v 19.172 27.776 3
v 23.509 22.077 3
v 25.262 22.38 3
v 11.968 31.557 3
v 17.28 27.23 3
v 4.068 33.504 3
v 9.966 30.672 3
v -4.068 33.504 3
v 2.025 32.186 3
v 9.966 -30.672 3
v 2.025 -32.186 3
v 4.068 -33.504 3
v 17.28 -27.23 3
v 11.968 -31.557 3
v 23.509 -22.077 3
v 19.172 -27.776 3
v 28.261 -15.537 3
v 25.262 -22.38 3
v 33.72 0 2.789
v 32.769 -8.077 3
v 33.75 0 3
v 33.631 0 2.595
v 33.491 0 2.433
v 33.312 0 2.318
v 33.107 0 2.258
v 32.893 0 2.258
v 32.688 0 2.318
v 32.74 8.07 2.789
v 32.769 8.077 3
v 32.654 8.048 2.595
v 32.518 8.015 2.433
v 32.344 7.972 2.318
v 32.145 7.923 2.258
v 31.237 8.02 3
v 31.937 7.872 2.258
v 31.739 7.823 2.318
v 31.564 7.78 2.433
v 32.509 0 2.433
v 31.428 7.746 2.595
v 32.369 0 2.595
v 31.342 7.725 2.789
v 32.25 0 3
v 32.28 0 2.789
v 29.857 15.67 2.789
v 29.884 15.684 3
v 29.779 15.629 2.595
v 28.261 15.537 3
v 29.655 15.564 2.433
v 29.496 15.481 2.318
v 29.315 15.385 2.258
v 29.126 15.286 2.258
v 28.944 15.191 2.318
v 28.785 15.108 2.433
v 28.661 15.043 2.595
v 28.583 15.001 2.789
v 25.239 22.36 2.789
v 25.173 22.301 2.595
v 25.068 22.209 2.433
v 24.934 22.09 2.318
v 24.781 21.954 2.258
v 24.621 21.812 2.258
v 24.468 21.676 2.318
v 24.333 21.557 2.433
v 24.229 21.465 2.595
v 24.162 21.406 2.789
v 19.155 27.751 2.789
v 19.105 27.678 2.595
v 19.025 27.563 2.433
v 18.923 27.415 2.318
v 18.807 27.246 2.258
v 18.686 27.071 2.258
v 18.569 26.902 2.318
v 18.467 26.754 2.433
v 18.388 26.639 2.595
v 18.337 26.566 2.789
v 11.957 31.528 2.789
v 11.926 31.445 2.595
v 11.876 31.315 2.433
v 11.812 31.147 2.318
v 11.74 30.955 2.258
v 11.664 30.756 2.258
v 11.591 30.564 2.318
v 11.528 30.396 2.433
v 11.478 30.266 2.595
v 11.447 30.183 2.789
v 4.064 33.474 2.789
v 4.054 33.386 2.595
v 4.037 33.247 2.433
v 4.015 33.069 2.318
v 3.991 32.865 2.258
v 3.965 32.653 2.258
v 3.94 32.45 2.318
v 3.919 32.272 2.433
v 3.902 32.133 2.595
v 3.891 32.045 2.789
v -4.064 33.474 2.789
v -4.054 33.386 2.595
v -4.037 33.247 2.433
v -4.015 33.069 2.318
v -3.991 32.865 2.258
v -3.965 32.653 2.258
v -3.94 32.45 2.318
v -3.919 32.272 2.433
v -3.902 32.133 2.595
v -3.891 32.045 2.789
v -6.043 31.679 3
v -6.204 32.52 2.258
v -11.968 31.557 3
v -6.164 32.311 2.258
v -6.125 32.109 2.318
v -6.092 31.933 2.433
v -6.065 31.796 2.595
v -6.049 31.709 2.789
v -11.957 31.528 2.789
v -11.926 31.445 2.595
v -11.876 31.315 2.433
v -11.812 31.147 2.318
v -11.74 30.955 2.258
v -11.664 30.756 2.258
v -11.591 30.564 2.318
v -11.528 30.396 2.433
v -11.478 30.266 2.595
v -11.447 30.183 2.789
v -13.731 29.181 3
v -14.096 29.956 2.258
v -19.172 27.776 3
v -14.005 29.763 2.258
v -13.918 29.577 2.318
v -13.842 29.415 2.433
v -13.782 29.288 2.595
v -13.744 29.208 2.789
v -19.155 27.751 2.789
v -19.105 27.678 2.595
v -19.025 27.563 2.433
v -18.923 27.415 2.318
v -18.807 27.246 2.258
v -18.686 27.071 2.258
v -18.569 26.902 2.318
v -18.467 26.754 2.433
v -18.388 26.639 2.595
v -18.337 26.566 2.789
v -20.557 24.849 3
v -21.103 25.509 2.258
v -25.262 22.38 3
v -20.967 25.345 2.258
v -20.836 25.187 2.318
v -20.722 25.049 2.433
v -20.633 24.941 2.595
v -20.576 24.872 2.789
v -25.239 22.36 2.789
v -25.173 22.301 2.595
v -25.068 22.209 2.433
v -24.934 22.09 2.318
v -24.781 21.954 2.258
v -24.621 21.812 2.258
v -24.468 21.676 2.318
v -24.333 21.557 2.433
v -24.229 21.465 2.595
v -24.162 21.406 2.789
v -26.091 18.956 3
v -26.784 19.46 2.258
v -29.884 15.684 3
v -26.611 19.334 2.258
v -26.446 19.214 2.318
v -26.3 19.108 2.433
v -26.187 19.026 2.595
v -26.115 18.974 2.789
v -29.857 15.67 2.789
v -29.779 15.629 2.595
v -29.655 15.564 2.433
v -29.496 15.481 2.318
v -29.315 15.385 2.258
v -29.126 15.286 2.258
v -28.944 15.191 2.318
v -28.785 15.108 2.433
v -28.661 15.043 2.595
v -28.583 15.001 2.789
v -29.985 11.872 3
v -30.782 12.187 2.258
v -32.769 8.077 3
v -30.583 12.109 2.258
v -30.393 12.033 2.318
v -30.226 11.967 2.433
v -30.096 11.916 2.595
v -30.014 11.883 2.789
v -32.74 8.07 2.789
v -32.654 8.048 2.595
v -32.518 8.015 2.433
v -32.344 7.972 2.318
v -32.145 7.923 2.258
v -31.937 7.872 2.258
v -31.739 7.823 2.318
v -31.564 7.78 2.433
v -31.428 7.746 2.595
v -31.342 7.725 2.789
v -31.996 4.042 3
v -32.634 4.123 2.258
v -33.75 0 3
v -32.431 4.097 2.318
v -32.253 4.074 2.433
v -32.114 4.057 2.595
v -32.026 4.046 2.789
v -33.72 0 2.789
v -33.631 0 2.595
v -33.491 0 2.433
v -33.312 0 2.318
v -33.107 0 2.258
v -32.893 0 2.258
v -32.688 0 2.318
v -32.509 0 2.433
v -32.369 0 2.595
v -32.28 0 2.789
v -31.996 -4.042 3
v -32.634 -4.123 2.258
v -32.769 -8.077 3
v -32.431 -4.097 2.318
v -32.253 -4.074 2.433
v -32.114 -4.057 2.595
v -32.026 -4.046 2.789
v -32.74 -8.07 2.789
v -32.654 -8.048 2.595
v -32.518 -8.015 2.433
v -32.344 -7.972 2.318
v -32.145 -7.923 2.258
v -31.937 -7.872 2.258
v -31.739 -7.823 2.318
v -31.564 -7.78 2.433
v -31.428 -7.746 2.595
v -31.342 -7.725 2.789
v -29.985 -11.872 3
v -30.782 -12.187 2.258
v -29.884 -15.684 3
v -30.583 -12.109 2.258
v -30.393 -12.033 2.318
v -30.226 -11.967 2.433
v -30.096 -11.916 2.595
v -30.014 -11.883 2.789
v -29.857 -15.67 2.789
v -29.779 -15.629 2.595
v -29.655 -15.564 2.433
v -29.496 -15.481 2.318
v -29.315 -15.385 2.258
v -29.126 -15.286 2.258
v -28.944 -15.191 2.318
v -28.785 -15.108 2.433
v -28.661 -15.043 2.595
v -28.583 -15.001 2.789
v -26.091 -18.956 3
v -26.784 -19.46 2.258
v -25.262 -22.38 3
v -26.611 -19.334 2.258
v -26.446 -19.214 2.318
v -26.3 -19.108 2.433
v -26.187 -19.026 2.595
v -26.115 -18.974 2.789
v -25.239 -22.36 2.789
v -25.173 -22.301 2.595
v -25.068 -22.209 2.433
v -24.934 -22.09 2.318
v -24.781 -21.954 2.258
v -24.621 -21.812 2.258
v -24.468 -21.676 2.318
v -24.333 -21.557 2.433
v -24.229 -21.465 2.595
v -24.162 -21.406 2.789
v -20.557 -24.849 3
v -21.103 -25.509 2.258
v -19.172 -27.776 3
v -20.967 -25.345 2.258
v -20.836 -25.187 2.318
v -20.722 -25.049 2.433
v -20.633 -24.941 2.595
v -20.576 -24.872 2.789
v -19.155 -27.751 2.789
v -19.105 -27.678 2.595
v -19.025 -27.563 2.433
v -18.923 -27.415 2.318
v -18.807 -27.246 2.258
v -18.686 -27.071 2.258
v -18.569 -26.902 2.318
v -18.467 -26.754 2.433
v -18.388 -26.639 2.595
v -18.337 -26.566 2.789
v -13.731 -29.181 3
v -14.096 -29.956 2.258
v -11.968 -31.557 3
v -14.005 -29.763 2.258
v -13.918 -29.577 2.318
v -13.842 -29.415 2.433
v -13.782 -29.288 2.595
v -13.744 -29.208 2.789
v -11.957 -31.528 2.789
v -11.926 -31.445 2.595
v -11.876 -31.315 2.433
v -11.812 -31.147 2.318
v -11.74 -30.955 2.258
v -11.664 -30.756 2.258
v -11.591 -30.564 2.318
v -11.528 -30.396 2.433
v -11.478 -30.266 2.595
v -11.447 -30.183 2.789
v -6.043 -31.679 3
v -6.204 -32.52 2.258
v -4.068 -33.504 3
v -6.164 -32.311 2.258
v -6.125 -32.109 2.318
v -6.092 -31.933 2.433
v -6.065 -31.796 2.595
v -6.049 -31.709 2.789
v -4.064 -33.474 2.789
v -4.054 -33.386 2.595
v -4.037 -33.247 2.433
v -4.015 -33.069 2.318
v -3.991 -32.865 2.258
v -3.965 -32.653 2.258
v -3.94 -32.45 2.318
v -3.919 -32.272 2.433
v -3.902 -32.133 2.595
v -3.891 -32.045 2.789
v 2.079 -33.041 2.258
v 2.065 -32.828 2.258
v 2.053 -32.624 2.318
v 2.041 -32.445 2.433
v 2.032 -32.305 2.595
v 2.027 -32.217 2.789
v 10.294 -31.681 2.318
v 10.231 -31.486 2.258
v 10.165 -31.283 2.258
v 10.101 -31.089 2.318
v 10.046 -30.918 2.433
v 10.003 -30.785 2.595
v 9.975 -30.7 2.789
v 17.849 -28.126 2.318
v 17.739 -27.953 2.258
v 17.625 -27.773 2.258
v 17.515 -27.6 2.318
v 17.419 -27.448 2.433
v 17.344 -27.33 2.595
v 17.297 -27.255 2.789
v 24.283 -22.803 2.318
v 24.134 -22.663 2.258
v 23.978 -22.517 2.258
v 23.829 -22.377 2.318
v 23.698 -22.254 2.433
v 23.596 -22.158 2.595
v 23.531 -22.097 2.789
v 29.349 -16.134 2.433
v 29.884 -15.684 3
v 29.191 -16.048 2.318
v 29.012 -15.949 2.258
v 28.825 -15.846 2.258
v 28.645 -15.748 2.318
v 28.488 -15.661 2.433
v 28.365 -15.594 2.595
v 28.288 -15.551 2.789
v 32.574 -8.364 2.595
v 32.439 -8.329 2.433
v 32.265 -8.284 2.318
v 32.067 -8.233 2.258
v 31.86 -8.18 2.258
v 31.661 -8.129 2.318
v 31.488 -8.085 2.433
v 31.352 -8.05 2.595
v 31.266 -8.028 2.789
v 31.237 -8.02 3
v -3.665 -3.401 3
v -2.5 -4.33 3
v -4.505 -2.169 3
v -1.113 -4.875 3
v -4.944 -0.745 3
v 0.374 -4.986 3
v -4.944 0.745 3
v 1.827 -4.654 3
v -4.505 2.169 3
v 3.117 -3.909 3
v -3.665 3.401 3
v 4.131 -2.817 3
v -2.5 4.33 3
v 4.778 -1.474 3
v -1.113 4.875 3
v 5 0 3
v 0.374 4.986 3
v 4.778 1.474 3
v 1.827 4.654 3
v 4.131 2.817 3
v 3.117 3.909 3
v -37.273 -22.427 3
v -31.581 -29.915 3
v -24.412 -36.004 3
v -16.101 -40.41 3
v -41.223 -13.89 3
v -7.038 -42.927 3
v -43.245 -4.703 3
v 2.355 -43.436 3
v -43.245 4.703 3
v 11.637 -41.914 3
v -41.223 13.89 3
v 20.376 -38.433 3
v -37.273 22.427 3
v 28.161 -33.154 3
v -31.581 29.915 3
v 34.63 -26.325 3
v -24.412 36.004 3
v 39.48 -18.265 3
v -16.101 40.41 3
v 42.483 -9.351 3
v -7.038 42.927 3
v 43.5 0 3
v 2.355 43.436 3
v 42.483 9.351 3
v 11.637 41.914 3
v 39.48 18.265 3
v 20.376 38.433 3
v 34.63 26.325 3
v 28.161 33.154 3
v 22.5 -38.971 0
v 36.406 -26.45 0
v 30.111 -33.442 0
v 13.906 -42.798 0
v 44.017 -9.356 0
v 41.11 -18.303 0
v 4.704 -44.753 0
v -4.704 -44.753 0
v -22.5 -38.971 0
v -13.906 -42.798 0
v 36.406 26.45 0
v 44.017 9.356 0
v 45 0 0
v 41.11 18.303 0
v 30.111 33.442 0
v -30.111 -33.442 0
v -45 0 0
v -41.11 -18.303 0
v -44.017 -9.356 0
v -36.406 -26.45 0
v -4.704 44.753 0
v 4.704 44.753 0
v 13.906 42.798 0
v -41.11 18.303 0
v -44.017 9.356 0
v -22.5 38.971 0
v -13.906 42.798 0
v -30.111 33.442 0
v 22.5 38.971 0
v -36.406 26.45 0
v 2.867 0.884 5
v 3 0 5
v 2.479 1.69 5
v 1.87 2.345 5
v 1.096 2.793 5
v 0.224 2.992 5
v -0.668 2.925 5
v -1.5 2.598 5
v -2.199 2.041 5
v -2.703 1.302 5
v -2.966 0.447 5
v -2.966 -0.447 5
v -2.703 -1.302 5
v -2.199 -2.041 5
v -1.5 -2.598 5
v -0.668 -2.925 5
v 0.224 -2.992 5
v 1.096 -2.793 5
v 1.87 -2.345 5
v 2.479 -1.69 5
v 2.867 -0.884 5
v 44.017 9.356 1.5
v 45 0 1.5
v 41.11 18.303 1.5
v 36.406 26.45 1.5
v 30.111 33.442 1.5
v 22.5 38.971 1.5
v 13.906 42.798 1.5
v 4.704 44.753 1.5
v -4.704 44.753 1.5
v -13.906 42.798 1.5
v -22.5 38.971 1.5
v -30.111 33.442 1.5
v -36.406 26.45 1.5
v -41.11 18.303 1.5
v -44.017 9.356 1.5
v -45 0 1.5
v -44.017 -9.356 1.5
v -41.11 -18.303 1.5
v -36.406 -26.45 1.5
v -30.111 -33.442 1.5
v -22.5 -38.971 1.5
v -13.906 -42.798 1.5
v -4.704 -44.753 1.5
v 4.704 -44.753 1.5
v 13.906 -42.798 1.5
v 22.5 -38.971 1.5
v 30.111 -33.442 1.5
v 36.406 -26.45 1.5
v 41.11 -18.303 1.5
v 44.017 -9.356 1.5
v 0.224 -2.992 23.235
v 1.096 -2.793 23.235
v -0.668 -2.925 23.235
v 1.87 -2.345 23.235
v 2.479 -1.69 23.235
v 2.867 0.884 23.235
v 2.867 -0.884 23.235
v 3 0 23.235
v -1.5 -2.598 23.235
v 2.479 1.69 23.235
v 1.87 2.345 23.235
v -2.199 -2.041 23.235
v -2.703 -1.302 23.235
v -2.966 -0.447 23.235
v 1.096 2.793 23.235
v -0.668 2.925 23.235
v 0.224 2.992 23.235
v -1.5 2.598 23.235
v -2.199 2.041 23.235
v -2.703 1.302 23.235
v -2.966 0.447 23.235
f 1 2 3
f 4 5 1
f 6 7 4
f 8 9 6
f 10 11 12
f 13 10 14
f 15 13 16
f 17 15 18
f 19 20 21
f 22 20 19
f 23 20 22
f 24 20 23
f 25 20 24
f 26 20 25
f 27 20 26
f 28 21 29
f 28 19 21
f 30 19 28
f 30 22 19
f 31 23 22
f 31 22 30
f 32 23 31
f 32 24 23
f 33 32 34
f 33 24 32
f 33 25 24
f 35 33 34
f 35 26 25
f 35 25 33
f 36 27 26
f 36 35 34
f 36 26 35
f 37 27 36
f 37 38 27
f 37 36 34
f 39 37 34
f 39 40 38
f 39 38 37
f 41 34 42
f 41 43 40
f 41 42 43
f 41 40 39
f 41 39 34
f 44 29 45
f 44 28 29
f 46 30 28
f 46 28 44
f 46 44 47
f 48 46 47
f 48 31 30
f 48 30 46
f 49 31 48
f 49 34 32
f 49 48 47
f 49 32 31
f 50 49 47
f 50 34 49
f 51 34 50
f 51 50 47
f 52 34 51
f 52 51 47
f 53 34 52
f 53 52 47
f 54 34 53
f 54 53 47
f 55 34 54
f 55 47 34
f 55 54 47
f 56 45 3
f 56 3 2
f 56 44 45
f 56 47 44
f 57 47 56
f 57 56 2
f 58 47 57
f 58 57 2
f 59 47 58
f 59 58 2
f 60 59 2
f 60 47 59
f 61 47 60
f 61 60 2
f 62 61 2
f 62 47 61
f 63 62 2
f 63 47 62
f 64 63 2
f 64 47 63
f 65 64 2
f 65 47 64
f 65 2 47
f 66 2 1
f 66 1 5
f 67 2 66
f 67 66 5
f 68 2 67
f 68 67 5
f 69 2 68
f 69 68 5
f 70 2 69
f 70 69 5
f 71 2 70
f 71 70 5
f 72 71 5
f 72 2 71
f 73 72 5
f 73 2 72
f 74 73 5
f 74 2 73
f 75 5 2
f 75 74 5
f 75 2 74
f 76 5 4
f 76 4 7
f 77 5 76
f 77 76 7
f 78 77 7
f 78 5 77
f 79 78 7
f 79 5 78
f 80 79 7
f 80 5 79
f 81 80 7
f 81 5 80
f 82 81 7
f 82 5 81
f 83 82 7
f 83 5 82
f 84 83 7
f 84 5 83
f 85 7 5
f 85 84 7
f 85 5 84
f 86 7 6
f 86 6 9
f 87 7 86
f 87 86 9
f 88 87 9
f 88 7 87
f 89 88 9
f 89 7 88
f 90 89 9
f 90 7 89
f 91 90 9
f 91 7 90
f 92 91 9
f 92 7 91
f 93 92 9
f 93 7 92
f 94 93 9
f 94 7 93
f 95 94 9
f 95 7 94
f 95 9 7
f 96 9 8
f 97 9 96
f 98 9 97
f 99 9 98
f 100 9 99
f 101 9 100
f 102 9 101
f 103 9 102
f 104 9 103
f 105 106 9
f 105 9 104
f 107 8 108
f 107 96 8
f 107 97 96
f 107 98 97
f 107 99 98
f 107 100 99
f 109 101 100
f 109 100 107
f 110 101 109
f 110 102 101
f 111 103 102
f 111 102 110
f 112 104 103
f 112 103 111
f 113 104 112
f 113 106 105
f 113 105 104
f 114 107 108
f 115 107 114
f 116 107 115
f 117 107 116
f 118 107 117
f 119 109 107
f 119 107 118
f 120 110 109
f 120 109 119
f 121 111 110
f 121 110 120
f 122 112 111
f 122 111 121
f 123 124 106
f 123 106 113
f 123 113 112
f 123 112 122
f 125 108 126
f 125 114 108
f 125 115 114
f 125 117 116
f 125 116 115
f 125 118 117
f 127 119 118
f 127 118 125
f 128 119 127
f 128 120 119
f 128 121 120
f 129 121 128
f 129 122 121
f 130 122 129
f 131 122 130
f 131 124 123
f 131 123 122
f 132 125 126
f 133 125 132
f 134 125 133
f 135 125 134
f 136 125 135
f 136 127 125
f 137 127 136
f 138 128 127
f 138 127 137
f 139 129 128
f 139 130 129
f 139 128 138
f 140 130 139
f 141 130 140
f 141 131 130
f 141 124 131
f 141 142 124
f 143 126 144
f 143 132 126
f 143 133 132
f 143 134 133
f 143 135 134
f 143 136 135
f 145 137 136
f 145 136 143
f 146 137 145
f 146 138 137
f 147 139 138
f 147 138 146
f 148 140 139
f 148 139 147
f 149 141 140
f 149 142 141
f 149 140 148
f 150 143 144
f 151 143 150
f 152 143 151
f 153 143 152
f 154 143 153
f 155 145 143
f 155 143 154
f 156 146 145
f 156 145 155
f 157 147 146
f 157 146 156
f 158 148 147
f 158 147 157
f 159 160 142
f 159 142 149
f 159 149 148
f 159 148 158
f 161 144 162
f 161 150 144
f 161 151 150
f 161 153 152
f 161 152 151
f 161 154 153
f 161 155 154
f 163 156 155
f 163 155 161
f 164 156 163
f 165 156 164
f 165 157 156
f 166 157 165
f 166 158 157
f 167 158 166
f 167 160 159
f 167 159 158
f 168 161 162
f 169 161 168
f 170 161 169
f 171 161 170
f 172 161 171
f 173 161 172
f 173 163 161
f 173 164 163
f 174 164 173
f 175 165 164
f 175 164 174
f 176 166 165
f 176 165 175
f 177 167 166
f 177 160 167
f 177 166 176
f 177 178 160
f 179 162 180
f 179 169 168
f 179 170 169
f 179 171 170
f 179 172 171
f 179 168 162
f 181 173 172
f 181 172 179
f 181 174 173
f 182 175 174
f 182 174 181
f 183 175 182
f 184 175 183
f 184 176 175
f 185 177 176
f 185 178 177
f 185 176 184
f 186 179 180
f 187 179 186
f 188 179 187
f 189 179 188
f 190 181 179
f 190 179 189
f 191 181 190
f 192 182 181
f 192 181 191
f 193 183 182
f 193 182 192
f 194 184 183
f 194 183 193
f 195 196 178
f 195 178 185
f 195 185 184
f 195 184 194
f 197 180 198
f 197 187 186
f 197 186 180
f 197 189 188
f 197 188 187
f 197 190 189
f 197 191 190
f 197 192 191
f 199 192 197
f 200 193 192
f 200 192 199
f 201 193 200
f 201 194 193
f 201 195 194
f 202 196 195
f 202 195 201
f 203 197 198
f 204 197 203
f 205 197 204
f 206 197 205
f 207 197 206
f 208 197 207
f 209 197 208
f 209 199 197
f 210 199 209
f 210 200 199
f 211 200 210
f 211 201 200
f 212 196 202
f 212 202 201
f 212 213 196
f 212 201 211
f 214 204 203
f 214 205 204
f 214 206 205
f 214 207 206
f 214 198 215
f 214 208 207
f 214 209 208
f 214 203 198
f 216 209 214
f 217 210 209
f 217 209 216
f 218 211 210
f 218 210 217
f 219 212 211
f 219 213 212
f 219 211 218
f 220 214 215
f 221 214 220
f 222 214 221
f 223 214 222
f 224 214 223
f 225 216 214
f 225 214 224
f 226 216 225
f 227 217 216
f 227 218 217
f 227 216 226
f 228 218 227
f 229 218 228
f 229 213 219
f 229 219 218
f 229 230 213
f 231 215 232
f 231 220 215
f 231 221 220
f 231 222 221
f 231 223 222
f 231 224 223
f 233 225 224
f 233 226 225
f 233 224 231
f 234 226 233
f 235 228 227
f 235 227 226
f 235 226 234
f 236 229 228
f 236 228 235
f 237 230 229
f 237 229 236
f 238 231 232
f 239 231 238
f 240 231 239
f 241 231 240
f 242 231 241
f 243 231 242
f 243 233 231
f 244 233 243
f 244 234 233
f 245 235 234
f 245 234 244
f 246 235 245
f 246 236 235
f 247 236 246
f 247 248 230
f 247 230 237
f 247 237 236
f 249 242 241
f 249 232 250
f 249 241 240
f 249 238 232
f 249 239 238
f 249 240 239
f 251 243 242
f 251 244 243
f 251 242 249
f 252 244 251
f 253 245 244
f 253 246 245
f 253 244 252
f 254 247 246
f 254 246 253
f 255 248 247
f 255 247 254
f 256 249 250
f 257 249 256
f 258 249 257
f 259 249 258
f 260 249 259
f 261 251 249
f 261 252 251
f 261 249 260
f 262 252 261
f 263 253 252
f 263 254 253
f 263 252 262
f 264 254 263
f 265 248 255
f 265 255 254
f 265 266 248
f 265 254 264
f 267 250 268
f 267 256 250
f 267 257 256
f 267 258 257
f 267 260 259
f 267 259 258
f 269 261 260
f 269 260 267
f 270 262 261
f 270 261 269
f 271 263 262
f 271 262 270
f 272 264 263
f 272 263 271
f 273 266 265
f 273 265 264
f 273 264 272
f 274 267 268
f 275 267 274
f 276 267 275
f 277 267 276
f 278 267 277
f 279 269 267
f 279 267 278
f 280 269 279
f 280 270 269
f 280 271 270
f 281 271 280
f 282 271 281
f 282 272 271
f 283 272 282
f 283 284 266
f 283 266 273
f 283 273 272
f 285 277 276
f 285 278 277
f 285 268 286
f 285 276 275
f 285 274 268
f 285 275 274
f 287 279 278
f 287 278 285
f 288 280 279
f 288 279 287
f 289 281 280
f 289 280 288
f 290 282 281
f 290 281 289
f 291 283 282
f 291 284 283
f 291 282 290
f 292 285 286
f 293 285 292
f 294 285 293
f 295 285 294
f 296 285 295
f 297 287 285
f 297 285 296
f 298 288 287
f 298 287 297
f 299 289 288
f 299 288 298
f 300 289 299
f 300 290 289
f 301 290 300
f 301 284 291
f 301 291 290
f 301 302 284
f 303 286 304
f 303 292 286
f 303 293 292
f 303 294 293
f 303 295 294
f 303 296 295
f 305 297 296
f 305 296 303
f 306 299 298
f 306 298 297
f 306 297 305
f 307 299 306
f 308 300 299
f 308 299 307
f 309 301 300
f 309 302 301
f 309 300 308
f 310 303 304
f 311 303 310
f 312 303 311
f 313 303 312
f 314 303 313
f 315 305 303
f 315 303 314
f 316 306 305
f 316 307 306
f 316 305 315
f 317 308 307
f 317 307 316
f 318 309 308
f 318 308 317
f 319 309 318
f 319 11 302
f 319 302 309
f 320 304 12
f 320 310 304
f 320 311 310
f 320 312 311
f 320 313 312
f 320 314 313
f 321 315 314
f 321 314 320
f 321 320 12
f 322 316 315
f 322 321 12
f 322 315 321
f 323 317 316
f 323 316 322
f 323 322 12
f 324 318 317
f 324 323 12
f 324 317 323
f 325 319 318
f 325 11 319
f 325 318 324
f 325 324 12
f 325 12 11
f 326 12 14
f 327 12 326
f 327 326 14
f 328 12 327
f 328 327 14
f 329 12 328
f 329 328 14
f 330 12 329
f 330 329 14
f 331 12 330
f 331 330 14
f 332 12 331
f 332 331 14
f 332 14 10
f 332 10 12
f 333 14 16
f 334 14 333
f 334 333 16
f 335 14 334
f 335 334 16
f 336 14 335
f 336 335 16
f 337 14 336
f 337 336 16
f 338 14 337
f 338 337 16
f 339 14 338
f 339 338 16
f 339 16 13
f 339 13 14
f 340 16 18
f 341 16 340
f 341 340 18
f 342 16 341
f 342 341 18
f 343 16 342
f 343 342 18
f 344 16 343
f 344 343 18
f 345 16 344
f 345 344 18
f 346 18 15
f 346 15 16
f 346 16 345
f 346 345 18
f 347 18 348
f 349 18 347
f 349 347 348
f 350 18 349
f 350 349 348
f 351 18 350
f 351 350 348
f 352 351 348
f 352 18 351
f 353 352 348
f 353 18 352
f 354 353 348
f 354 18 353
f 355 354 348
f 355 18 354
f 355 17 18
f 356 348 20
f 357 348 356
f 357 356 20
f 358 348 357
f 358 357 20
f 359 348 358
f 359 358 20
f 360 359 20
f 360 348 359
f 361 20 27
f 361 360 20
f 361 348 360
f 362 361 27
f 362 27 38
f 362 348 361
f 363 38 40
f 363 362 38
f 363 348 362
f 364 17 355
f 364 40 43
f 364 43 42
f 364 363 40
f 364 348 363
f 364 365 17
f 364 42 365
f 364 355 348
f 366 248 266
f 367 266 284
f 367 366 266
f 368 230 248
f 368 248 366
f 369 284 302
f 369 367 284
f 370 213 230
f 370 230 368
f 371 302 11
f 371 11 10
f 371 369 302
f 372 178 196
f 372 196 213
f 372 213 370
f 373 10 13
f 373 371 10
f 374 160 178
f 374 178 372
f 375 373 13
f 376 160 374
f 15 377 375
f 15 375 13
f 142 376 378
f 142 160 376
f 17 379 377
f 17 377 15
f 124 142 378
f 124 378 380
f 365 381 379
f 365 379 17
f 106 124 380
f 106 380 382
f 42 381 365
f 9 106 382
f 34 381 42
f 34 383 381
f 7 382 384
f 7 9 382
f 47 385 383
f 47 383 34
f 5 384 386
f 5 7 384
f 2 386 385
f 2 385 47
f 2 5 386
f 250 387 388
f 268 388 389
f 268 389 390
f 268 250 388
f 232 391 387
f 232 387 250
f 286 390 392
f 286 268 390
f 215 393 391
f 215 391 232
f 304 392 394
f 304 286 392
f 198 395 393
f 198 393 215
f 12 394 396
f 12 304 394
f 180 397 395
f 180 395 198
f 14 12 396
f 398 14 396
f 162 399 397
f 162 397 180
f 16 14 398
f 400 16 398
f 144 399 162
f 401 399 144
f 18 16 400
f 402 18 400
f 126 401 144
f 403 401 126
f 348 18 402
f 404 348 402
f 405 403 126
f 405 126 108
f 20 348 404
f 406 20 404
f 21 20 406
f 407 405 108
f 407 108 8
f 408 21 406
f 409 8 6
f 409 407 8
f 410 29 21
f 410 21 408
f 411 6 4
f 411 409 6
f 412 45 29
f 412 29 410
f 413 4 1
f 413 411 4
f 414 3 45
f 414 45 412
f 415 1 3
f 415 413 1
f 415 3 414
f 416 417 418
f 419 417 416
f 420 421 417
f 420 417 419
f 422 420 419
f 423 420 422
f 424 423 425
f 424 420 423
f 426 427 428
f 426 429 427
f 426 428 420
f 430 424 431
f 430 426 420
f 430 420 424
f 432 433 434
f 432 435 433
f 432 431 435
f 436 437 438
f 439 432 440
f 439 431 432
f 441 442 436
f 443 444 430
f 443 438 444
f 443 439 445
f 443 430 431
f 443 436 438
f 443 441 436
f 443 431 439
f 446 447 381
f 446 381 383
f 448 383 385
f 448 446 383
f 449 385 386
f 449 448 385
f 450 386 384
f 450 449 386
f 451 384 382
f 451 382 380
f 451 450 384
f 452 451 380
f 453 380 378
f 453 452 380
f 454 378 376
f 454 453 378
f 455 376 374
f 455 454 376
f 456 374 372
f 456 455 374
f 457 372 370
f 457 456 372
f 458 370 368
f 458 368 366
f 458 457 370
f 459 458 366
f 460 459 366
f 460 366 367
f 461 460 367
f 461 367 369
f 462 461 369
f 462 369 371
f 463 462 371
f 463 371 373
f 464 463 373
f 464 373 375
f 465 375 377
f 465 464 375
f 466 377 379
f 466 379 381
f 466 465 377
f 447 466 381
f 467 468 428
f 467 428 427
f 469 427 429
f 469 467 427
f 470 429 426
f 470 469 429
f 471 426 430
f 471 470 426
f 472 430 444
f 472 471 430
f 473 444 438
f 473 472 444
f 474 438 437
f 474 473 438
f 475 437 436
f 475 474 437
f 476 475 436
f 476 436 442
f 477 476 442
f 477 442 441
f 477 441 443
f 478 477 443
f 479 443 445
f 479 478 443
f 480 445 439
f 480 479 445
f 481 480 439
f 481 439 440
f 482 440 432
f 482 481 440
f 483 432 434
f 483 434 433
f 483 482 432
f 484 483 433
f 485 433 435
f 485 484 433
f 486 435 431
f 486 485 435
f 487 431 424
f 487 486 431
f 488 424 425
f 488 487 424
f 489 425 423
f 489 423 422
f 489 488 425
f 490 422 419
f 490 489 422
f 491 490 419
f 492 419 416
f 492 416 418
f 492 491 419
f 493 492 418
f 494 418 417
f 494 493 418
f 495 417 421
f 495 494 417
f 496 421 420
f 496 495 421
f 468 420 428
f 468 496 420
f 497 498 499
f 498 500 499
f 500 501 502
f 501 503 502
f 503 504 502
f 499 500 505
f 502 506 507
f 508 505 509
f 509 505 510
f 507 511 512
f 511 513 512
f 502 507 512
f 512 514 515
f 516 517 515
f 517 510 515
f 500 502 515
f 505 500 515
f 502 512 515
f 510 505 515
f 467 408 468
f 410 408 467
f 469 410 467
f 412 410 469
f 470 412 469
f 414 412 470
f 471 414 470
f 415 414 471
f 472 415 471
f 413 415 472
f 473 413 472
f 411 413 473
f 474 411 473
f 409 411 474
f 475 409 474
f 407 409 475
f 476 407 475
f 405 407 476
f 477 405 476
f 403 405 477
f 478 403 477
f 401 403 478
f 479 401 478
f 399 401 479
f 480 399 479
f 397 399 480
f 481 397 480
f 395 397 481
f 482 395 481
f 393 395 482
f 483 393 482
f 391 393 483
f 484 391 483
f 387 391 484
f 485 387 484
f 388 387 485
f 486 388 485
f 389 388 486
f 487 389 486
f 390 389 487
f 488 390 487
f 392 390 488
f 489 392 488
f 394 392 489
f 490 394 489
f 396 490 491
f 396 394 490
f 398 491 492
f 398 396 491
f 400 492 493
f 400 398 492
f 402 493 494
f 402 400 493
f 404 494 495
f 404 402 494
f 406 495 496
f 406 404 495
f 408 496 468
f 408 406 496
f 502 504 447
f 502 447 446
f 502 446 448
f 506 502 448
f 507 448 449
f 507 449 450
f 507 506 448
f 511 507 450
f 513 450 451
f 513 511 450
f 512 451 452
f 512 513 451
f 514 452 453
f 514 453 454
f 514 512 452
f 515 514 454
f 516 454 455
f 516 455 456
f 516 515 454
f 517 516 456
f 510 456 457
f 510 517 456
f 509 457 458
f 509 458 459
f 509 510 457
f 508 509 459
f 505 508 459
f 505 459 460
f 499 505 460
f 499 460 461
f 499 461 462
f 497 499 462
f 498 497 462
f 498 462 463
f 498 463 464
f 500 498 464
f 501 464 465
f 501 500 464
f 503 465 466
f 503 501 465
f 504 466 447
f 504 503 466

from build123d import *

# Parameters (mm, degrees)
F0_W    = 3
F0_H    = 20.235256
F2_SIZE = 1.5
F3_SIZE = 2


with BuildPart() as f1:
    # F0 (on Front) → F1 (revolve)
    with BuildSketch(Plane.XZ):
        with BuildLine():
            Line((0, 3), (0, 0))
            Line((0, 0), (45, 0))
            Line((45, 0), (45, 3))
            Line((45, 3), (33.75, 3))
            ThreePointArc((33.75, 3), (33, 2.25), (32.25, 3))
            Line((32.25, 3), (3, 3))
            Line((3, 3), (0, 3))
        make_face()
        with Locations((1.5, 13.117628)):
            Rectangle(F0_W, F0_H)
    revolve(axis=Axis((0, 0, 18.496849), (0, 0, 1)))

    # F2
    f2_edges = [f1.edges().sort_by_distance(p)[0] for p in [
        (-45, 0, 3),
    ]]
    chamfer(f2_edges, length=F2_SIZE)

    # F3
    f3_edges = [f1.edges().sort_by_distance(p)[0] for p in [
        (-3, 0, 3),
    ]]
    chamfer(f3_edges, length=F3_SIZE)


solid = f1.part
